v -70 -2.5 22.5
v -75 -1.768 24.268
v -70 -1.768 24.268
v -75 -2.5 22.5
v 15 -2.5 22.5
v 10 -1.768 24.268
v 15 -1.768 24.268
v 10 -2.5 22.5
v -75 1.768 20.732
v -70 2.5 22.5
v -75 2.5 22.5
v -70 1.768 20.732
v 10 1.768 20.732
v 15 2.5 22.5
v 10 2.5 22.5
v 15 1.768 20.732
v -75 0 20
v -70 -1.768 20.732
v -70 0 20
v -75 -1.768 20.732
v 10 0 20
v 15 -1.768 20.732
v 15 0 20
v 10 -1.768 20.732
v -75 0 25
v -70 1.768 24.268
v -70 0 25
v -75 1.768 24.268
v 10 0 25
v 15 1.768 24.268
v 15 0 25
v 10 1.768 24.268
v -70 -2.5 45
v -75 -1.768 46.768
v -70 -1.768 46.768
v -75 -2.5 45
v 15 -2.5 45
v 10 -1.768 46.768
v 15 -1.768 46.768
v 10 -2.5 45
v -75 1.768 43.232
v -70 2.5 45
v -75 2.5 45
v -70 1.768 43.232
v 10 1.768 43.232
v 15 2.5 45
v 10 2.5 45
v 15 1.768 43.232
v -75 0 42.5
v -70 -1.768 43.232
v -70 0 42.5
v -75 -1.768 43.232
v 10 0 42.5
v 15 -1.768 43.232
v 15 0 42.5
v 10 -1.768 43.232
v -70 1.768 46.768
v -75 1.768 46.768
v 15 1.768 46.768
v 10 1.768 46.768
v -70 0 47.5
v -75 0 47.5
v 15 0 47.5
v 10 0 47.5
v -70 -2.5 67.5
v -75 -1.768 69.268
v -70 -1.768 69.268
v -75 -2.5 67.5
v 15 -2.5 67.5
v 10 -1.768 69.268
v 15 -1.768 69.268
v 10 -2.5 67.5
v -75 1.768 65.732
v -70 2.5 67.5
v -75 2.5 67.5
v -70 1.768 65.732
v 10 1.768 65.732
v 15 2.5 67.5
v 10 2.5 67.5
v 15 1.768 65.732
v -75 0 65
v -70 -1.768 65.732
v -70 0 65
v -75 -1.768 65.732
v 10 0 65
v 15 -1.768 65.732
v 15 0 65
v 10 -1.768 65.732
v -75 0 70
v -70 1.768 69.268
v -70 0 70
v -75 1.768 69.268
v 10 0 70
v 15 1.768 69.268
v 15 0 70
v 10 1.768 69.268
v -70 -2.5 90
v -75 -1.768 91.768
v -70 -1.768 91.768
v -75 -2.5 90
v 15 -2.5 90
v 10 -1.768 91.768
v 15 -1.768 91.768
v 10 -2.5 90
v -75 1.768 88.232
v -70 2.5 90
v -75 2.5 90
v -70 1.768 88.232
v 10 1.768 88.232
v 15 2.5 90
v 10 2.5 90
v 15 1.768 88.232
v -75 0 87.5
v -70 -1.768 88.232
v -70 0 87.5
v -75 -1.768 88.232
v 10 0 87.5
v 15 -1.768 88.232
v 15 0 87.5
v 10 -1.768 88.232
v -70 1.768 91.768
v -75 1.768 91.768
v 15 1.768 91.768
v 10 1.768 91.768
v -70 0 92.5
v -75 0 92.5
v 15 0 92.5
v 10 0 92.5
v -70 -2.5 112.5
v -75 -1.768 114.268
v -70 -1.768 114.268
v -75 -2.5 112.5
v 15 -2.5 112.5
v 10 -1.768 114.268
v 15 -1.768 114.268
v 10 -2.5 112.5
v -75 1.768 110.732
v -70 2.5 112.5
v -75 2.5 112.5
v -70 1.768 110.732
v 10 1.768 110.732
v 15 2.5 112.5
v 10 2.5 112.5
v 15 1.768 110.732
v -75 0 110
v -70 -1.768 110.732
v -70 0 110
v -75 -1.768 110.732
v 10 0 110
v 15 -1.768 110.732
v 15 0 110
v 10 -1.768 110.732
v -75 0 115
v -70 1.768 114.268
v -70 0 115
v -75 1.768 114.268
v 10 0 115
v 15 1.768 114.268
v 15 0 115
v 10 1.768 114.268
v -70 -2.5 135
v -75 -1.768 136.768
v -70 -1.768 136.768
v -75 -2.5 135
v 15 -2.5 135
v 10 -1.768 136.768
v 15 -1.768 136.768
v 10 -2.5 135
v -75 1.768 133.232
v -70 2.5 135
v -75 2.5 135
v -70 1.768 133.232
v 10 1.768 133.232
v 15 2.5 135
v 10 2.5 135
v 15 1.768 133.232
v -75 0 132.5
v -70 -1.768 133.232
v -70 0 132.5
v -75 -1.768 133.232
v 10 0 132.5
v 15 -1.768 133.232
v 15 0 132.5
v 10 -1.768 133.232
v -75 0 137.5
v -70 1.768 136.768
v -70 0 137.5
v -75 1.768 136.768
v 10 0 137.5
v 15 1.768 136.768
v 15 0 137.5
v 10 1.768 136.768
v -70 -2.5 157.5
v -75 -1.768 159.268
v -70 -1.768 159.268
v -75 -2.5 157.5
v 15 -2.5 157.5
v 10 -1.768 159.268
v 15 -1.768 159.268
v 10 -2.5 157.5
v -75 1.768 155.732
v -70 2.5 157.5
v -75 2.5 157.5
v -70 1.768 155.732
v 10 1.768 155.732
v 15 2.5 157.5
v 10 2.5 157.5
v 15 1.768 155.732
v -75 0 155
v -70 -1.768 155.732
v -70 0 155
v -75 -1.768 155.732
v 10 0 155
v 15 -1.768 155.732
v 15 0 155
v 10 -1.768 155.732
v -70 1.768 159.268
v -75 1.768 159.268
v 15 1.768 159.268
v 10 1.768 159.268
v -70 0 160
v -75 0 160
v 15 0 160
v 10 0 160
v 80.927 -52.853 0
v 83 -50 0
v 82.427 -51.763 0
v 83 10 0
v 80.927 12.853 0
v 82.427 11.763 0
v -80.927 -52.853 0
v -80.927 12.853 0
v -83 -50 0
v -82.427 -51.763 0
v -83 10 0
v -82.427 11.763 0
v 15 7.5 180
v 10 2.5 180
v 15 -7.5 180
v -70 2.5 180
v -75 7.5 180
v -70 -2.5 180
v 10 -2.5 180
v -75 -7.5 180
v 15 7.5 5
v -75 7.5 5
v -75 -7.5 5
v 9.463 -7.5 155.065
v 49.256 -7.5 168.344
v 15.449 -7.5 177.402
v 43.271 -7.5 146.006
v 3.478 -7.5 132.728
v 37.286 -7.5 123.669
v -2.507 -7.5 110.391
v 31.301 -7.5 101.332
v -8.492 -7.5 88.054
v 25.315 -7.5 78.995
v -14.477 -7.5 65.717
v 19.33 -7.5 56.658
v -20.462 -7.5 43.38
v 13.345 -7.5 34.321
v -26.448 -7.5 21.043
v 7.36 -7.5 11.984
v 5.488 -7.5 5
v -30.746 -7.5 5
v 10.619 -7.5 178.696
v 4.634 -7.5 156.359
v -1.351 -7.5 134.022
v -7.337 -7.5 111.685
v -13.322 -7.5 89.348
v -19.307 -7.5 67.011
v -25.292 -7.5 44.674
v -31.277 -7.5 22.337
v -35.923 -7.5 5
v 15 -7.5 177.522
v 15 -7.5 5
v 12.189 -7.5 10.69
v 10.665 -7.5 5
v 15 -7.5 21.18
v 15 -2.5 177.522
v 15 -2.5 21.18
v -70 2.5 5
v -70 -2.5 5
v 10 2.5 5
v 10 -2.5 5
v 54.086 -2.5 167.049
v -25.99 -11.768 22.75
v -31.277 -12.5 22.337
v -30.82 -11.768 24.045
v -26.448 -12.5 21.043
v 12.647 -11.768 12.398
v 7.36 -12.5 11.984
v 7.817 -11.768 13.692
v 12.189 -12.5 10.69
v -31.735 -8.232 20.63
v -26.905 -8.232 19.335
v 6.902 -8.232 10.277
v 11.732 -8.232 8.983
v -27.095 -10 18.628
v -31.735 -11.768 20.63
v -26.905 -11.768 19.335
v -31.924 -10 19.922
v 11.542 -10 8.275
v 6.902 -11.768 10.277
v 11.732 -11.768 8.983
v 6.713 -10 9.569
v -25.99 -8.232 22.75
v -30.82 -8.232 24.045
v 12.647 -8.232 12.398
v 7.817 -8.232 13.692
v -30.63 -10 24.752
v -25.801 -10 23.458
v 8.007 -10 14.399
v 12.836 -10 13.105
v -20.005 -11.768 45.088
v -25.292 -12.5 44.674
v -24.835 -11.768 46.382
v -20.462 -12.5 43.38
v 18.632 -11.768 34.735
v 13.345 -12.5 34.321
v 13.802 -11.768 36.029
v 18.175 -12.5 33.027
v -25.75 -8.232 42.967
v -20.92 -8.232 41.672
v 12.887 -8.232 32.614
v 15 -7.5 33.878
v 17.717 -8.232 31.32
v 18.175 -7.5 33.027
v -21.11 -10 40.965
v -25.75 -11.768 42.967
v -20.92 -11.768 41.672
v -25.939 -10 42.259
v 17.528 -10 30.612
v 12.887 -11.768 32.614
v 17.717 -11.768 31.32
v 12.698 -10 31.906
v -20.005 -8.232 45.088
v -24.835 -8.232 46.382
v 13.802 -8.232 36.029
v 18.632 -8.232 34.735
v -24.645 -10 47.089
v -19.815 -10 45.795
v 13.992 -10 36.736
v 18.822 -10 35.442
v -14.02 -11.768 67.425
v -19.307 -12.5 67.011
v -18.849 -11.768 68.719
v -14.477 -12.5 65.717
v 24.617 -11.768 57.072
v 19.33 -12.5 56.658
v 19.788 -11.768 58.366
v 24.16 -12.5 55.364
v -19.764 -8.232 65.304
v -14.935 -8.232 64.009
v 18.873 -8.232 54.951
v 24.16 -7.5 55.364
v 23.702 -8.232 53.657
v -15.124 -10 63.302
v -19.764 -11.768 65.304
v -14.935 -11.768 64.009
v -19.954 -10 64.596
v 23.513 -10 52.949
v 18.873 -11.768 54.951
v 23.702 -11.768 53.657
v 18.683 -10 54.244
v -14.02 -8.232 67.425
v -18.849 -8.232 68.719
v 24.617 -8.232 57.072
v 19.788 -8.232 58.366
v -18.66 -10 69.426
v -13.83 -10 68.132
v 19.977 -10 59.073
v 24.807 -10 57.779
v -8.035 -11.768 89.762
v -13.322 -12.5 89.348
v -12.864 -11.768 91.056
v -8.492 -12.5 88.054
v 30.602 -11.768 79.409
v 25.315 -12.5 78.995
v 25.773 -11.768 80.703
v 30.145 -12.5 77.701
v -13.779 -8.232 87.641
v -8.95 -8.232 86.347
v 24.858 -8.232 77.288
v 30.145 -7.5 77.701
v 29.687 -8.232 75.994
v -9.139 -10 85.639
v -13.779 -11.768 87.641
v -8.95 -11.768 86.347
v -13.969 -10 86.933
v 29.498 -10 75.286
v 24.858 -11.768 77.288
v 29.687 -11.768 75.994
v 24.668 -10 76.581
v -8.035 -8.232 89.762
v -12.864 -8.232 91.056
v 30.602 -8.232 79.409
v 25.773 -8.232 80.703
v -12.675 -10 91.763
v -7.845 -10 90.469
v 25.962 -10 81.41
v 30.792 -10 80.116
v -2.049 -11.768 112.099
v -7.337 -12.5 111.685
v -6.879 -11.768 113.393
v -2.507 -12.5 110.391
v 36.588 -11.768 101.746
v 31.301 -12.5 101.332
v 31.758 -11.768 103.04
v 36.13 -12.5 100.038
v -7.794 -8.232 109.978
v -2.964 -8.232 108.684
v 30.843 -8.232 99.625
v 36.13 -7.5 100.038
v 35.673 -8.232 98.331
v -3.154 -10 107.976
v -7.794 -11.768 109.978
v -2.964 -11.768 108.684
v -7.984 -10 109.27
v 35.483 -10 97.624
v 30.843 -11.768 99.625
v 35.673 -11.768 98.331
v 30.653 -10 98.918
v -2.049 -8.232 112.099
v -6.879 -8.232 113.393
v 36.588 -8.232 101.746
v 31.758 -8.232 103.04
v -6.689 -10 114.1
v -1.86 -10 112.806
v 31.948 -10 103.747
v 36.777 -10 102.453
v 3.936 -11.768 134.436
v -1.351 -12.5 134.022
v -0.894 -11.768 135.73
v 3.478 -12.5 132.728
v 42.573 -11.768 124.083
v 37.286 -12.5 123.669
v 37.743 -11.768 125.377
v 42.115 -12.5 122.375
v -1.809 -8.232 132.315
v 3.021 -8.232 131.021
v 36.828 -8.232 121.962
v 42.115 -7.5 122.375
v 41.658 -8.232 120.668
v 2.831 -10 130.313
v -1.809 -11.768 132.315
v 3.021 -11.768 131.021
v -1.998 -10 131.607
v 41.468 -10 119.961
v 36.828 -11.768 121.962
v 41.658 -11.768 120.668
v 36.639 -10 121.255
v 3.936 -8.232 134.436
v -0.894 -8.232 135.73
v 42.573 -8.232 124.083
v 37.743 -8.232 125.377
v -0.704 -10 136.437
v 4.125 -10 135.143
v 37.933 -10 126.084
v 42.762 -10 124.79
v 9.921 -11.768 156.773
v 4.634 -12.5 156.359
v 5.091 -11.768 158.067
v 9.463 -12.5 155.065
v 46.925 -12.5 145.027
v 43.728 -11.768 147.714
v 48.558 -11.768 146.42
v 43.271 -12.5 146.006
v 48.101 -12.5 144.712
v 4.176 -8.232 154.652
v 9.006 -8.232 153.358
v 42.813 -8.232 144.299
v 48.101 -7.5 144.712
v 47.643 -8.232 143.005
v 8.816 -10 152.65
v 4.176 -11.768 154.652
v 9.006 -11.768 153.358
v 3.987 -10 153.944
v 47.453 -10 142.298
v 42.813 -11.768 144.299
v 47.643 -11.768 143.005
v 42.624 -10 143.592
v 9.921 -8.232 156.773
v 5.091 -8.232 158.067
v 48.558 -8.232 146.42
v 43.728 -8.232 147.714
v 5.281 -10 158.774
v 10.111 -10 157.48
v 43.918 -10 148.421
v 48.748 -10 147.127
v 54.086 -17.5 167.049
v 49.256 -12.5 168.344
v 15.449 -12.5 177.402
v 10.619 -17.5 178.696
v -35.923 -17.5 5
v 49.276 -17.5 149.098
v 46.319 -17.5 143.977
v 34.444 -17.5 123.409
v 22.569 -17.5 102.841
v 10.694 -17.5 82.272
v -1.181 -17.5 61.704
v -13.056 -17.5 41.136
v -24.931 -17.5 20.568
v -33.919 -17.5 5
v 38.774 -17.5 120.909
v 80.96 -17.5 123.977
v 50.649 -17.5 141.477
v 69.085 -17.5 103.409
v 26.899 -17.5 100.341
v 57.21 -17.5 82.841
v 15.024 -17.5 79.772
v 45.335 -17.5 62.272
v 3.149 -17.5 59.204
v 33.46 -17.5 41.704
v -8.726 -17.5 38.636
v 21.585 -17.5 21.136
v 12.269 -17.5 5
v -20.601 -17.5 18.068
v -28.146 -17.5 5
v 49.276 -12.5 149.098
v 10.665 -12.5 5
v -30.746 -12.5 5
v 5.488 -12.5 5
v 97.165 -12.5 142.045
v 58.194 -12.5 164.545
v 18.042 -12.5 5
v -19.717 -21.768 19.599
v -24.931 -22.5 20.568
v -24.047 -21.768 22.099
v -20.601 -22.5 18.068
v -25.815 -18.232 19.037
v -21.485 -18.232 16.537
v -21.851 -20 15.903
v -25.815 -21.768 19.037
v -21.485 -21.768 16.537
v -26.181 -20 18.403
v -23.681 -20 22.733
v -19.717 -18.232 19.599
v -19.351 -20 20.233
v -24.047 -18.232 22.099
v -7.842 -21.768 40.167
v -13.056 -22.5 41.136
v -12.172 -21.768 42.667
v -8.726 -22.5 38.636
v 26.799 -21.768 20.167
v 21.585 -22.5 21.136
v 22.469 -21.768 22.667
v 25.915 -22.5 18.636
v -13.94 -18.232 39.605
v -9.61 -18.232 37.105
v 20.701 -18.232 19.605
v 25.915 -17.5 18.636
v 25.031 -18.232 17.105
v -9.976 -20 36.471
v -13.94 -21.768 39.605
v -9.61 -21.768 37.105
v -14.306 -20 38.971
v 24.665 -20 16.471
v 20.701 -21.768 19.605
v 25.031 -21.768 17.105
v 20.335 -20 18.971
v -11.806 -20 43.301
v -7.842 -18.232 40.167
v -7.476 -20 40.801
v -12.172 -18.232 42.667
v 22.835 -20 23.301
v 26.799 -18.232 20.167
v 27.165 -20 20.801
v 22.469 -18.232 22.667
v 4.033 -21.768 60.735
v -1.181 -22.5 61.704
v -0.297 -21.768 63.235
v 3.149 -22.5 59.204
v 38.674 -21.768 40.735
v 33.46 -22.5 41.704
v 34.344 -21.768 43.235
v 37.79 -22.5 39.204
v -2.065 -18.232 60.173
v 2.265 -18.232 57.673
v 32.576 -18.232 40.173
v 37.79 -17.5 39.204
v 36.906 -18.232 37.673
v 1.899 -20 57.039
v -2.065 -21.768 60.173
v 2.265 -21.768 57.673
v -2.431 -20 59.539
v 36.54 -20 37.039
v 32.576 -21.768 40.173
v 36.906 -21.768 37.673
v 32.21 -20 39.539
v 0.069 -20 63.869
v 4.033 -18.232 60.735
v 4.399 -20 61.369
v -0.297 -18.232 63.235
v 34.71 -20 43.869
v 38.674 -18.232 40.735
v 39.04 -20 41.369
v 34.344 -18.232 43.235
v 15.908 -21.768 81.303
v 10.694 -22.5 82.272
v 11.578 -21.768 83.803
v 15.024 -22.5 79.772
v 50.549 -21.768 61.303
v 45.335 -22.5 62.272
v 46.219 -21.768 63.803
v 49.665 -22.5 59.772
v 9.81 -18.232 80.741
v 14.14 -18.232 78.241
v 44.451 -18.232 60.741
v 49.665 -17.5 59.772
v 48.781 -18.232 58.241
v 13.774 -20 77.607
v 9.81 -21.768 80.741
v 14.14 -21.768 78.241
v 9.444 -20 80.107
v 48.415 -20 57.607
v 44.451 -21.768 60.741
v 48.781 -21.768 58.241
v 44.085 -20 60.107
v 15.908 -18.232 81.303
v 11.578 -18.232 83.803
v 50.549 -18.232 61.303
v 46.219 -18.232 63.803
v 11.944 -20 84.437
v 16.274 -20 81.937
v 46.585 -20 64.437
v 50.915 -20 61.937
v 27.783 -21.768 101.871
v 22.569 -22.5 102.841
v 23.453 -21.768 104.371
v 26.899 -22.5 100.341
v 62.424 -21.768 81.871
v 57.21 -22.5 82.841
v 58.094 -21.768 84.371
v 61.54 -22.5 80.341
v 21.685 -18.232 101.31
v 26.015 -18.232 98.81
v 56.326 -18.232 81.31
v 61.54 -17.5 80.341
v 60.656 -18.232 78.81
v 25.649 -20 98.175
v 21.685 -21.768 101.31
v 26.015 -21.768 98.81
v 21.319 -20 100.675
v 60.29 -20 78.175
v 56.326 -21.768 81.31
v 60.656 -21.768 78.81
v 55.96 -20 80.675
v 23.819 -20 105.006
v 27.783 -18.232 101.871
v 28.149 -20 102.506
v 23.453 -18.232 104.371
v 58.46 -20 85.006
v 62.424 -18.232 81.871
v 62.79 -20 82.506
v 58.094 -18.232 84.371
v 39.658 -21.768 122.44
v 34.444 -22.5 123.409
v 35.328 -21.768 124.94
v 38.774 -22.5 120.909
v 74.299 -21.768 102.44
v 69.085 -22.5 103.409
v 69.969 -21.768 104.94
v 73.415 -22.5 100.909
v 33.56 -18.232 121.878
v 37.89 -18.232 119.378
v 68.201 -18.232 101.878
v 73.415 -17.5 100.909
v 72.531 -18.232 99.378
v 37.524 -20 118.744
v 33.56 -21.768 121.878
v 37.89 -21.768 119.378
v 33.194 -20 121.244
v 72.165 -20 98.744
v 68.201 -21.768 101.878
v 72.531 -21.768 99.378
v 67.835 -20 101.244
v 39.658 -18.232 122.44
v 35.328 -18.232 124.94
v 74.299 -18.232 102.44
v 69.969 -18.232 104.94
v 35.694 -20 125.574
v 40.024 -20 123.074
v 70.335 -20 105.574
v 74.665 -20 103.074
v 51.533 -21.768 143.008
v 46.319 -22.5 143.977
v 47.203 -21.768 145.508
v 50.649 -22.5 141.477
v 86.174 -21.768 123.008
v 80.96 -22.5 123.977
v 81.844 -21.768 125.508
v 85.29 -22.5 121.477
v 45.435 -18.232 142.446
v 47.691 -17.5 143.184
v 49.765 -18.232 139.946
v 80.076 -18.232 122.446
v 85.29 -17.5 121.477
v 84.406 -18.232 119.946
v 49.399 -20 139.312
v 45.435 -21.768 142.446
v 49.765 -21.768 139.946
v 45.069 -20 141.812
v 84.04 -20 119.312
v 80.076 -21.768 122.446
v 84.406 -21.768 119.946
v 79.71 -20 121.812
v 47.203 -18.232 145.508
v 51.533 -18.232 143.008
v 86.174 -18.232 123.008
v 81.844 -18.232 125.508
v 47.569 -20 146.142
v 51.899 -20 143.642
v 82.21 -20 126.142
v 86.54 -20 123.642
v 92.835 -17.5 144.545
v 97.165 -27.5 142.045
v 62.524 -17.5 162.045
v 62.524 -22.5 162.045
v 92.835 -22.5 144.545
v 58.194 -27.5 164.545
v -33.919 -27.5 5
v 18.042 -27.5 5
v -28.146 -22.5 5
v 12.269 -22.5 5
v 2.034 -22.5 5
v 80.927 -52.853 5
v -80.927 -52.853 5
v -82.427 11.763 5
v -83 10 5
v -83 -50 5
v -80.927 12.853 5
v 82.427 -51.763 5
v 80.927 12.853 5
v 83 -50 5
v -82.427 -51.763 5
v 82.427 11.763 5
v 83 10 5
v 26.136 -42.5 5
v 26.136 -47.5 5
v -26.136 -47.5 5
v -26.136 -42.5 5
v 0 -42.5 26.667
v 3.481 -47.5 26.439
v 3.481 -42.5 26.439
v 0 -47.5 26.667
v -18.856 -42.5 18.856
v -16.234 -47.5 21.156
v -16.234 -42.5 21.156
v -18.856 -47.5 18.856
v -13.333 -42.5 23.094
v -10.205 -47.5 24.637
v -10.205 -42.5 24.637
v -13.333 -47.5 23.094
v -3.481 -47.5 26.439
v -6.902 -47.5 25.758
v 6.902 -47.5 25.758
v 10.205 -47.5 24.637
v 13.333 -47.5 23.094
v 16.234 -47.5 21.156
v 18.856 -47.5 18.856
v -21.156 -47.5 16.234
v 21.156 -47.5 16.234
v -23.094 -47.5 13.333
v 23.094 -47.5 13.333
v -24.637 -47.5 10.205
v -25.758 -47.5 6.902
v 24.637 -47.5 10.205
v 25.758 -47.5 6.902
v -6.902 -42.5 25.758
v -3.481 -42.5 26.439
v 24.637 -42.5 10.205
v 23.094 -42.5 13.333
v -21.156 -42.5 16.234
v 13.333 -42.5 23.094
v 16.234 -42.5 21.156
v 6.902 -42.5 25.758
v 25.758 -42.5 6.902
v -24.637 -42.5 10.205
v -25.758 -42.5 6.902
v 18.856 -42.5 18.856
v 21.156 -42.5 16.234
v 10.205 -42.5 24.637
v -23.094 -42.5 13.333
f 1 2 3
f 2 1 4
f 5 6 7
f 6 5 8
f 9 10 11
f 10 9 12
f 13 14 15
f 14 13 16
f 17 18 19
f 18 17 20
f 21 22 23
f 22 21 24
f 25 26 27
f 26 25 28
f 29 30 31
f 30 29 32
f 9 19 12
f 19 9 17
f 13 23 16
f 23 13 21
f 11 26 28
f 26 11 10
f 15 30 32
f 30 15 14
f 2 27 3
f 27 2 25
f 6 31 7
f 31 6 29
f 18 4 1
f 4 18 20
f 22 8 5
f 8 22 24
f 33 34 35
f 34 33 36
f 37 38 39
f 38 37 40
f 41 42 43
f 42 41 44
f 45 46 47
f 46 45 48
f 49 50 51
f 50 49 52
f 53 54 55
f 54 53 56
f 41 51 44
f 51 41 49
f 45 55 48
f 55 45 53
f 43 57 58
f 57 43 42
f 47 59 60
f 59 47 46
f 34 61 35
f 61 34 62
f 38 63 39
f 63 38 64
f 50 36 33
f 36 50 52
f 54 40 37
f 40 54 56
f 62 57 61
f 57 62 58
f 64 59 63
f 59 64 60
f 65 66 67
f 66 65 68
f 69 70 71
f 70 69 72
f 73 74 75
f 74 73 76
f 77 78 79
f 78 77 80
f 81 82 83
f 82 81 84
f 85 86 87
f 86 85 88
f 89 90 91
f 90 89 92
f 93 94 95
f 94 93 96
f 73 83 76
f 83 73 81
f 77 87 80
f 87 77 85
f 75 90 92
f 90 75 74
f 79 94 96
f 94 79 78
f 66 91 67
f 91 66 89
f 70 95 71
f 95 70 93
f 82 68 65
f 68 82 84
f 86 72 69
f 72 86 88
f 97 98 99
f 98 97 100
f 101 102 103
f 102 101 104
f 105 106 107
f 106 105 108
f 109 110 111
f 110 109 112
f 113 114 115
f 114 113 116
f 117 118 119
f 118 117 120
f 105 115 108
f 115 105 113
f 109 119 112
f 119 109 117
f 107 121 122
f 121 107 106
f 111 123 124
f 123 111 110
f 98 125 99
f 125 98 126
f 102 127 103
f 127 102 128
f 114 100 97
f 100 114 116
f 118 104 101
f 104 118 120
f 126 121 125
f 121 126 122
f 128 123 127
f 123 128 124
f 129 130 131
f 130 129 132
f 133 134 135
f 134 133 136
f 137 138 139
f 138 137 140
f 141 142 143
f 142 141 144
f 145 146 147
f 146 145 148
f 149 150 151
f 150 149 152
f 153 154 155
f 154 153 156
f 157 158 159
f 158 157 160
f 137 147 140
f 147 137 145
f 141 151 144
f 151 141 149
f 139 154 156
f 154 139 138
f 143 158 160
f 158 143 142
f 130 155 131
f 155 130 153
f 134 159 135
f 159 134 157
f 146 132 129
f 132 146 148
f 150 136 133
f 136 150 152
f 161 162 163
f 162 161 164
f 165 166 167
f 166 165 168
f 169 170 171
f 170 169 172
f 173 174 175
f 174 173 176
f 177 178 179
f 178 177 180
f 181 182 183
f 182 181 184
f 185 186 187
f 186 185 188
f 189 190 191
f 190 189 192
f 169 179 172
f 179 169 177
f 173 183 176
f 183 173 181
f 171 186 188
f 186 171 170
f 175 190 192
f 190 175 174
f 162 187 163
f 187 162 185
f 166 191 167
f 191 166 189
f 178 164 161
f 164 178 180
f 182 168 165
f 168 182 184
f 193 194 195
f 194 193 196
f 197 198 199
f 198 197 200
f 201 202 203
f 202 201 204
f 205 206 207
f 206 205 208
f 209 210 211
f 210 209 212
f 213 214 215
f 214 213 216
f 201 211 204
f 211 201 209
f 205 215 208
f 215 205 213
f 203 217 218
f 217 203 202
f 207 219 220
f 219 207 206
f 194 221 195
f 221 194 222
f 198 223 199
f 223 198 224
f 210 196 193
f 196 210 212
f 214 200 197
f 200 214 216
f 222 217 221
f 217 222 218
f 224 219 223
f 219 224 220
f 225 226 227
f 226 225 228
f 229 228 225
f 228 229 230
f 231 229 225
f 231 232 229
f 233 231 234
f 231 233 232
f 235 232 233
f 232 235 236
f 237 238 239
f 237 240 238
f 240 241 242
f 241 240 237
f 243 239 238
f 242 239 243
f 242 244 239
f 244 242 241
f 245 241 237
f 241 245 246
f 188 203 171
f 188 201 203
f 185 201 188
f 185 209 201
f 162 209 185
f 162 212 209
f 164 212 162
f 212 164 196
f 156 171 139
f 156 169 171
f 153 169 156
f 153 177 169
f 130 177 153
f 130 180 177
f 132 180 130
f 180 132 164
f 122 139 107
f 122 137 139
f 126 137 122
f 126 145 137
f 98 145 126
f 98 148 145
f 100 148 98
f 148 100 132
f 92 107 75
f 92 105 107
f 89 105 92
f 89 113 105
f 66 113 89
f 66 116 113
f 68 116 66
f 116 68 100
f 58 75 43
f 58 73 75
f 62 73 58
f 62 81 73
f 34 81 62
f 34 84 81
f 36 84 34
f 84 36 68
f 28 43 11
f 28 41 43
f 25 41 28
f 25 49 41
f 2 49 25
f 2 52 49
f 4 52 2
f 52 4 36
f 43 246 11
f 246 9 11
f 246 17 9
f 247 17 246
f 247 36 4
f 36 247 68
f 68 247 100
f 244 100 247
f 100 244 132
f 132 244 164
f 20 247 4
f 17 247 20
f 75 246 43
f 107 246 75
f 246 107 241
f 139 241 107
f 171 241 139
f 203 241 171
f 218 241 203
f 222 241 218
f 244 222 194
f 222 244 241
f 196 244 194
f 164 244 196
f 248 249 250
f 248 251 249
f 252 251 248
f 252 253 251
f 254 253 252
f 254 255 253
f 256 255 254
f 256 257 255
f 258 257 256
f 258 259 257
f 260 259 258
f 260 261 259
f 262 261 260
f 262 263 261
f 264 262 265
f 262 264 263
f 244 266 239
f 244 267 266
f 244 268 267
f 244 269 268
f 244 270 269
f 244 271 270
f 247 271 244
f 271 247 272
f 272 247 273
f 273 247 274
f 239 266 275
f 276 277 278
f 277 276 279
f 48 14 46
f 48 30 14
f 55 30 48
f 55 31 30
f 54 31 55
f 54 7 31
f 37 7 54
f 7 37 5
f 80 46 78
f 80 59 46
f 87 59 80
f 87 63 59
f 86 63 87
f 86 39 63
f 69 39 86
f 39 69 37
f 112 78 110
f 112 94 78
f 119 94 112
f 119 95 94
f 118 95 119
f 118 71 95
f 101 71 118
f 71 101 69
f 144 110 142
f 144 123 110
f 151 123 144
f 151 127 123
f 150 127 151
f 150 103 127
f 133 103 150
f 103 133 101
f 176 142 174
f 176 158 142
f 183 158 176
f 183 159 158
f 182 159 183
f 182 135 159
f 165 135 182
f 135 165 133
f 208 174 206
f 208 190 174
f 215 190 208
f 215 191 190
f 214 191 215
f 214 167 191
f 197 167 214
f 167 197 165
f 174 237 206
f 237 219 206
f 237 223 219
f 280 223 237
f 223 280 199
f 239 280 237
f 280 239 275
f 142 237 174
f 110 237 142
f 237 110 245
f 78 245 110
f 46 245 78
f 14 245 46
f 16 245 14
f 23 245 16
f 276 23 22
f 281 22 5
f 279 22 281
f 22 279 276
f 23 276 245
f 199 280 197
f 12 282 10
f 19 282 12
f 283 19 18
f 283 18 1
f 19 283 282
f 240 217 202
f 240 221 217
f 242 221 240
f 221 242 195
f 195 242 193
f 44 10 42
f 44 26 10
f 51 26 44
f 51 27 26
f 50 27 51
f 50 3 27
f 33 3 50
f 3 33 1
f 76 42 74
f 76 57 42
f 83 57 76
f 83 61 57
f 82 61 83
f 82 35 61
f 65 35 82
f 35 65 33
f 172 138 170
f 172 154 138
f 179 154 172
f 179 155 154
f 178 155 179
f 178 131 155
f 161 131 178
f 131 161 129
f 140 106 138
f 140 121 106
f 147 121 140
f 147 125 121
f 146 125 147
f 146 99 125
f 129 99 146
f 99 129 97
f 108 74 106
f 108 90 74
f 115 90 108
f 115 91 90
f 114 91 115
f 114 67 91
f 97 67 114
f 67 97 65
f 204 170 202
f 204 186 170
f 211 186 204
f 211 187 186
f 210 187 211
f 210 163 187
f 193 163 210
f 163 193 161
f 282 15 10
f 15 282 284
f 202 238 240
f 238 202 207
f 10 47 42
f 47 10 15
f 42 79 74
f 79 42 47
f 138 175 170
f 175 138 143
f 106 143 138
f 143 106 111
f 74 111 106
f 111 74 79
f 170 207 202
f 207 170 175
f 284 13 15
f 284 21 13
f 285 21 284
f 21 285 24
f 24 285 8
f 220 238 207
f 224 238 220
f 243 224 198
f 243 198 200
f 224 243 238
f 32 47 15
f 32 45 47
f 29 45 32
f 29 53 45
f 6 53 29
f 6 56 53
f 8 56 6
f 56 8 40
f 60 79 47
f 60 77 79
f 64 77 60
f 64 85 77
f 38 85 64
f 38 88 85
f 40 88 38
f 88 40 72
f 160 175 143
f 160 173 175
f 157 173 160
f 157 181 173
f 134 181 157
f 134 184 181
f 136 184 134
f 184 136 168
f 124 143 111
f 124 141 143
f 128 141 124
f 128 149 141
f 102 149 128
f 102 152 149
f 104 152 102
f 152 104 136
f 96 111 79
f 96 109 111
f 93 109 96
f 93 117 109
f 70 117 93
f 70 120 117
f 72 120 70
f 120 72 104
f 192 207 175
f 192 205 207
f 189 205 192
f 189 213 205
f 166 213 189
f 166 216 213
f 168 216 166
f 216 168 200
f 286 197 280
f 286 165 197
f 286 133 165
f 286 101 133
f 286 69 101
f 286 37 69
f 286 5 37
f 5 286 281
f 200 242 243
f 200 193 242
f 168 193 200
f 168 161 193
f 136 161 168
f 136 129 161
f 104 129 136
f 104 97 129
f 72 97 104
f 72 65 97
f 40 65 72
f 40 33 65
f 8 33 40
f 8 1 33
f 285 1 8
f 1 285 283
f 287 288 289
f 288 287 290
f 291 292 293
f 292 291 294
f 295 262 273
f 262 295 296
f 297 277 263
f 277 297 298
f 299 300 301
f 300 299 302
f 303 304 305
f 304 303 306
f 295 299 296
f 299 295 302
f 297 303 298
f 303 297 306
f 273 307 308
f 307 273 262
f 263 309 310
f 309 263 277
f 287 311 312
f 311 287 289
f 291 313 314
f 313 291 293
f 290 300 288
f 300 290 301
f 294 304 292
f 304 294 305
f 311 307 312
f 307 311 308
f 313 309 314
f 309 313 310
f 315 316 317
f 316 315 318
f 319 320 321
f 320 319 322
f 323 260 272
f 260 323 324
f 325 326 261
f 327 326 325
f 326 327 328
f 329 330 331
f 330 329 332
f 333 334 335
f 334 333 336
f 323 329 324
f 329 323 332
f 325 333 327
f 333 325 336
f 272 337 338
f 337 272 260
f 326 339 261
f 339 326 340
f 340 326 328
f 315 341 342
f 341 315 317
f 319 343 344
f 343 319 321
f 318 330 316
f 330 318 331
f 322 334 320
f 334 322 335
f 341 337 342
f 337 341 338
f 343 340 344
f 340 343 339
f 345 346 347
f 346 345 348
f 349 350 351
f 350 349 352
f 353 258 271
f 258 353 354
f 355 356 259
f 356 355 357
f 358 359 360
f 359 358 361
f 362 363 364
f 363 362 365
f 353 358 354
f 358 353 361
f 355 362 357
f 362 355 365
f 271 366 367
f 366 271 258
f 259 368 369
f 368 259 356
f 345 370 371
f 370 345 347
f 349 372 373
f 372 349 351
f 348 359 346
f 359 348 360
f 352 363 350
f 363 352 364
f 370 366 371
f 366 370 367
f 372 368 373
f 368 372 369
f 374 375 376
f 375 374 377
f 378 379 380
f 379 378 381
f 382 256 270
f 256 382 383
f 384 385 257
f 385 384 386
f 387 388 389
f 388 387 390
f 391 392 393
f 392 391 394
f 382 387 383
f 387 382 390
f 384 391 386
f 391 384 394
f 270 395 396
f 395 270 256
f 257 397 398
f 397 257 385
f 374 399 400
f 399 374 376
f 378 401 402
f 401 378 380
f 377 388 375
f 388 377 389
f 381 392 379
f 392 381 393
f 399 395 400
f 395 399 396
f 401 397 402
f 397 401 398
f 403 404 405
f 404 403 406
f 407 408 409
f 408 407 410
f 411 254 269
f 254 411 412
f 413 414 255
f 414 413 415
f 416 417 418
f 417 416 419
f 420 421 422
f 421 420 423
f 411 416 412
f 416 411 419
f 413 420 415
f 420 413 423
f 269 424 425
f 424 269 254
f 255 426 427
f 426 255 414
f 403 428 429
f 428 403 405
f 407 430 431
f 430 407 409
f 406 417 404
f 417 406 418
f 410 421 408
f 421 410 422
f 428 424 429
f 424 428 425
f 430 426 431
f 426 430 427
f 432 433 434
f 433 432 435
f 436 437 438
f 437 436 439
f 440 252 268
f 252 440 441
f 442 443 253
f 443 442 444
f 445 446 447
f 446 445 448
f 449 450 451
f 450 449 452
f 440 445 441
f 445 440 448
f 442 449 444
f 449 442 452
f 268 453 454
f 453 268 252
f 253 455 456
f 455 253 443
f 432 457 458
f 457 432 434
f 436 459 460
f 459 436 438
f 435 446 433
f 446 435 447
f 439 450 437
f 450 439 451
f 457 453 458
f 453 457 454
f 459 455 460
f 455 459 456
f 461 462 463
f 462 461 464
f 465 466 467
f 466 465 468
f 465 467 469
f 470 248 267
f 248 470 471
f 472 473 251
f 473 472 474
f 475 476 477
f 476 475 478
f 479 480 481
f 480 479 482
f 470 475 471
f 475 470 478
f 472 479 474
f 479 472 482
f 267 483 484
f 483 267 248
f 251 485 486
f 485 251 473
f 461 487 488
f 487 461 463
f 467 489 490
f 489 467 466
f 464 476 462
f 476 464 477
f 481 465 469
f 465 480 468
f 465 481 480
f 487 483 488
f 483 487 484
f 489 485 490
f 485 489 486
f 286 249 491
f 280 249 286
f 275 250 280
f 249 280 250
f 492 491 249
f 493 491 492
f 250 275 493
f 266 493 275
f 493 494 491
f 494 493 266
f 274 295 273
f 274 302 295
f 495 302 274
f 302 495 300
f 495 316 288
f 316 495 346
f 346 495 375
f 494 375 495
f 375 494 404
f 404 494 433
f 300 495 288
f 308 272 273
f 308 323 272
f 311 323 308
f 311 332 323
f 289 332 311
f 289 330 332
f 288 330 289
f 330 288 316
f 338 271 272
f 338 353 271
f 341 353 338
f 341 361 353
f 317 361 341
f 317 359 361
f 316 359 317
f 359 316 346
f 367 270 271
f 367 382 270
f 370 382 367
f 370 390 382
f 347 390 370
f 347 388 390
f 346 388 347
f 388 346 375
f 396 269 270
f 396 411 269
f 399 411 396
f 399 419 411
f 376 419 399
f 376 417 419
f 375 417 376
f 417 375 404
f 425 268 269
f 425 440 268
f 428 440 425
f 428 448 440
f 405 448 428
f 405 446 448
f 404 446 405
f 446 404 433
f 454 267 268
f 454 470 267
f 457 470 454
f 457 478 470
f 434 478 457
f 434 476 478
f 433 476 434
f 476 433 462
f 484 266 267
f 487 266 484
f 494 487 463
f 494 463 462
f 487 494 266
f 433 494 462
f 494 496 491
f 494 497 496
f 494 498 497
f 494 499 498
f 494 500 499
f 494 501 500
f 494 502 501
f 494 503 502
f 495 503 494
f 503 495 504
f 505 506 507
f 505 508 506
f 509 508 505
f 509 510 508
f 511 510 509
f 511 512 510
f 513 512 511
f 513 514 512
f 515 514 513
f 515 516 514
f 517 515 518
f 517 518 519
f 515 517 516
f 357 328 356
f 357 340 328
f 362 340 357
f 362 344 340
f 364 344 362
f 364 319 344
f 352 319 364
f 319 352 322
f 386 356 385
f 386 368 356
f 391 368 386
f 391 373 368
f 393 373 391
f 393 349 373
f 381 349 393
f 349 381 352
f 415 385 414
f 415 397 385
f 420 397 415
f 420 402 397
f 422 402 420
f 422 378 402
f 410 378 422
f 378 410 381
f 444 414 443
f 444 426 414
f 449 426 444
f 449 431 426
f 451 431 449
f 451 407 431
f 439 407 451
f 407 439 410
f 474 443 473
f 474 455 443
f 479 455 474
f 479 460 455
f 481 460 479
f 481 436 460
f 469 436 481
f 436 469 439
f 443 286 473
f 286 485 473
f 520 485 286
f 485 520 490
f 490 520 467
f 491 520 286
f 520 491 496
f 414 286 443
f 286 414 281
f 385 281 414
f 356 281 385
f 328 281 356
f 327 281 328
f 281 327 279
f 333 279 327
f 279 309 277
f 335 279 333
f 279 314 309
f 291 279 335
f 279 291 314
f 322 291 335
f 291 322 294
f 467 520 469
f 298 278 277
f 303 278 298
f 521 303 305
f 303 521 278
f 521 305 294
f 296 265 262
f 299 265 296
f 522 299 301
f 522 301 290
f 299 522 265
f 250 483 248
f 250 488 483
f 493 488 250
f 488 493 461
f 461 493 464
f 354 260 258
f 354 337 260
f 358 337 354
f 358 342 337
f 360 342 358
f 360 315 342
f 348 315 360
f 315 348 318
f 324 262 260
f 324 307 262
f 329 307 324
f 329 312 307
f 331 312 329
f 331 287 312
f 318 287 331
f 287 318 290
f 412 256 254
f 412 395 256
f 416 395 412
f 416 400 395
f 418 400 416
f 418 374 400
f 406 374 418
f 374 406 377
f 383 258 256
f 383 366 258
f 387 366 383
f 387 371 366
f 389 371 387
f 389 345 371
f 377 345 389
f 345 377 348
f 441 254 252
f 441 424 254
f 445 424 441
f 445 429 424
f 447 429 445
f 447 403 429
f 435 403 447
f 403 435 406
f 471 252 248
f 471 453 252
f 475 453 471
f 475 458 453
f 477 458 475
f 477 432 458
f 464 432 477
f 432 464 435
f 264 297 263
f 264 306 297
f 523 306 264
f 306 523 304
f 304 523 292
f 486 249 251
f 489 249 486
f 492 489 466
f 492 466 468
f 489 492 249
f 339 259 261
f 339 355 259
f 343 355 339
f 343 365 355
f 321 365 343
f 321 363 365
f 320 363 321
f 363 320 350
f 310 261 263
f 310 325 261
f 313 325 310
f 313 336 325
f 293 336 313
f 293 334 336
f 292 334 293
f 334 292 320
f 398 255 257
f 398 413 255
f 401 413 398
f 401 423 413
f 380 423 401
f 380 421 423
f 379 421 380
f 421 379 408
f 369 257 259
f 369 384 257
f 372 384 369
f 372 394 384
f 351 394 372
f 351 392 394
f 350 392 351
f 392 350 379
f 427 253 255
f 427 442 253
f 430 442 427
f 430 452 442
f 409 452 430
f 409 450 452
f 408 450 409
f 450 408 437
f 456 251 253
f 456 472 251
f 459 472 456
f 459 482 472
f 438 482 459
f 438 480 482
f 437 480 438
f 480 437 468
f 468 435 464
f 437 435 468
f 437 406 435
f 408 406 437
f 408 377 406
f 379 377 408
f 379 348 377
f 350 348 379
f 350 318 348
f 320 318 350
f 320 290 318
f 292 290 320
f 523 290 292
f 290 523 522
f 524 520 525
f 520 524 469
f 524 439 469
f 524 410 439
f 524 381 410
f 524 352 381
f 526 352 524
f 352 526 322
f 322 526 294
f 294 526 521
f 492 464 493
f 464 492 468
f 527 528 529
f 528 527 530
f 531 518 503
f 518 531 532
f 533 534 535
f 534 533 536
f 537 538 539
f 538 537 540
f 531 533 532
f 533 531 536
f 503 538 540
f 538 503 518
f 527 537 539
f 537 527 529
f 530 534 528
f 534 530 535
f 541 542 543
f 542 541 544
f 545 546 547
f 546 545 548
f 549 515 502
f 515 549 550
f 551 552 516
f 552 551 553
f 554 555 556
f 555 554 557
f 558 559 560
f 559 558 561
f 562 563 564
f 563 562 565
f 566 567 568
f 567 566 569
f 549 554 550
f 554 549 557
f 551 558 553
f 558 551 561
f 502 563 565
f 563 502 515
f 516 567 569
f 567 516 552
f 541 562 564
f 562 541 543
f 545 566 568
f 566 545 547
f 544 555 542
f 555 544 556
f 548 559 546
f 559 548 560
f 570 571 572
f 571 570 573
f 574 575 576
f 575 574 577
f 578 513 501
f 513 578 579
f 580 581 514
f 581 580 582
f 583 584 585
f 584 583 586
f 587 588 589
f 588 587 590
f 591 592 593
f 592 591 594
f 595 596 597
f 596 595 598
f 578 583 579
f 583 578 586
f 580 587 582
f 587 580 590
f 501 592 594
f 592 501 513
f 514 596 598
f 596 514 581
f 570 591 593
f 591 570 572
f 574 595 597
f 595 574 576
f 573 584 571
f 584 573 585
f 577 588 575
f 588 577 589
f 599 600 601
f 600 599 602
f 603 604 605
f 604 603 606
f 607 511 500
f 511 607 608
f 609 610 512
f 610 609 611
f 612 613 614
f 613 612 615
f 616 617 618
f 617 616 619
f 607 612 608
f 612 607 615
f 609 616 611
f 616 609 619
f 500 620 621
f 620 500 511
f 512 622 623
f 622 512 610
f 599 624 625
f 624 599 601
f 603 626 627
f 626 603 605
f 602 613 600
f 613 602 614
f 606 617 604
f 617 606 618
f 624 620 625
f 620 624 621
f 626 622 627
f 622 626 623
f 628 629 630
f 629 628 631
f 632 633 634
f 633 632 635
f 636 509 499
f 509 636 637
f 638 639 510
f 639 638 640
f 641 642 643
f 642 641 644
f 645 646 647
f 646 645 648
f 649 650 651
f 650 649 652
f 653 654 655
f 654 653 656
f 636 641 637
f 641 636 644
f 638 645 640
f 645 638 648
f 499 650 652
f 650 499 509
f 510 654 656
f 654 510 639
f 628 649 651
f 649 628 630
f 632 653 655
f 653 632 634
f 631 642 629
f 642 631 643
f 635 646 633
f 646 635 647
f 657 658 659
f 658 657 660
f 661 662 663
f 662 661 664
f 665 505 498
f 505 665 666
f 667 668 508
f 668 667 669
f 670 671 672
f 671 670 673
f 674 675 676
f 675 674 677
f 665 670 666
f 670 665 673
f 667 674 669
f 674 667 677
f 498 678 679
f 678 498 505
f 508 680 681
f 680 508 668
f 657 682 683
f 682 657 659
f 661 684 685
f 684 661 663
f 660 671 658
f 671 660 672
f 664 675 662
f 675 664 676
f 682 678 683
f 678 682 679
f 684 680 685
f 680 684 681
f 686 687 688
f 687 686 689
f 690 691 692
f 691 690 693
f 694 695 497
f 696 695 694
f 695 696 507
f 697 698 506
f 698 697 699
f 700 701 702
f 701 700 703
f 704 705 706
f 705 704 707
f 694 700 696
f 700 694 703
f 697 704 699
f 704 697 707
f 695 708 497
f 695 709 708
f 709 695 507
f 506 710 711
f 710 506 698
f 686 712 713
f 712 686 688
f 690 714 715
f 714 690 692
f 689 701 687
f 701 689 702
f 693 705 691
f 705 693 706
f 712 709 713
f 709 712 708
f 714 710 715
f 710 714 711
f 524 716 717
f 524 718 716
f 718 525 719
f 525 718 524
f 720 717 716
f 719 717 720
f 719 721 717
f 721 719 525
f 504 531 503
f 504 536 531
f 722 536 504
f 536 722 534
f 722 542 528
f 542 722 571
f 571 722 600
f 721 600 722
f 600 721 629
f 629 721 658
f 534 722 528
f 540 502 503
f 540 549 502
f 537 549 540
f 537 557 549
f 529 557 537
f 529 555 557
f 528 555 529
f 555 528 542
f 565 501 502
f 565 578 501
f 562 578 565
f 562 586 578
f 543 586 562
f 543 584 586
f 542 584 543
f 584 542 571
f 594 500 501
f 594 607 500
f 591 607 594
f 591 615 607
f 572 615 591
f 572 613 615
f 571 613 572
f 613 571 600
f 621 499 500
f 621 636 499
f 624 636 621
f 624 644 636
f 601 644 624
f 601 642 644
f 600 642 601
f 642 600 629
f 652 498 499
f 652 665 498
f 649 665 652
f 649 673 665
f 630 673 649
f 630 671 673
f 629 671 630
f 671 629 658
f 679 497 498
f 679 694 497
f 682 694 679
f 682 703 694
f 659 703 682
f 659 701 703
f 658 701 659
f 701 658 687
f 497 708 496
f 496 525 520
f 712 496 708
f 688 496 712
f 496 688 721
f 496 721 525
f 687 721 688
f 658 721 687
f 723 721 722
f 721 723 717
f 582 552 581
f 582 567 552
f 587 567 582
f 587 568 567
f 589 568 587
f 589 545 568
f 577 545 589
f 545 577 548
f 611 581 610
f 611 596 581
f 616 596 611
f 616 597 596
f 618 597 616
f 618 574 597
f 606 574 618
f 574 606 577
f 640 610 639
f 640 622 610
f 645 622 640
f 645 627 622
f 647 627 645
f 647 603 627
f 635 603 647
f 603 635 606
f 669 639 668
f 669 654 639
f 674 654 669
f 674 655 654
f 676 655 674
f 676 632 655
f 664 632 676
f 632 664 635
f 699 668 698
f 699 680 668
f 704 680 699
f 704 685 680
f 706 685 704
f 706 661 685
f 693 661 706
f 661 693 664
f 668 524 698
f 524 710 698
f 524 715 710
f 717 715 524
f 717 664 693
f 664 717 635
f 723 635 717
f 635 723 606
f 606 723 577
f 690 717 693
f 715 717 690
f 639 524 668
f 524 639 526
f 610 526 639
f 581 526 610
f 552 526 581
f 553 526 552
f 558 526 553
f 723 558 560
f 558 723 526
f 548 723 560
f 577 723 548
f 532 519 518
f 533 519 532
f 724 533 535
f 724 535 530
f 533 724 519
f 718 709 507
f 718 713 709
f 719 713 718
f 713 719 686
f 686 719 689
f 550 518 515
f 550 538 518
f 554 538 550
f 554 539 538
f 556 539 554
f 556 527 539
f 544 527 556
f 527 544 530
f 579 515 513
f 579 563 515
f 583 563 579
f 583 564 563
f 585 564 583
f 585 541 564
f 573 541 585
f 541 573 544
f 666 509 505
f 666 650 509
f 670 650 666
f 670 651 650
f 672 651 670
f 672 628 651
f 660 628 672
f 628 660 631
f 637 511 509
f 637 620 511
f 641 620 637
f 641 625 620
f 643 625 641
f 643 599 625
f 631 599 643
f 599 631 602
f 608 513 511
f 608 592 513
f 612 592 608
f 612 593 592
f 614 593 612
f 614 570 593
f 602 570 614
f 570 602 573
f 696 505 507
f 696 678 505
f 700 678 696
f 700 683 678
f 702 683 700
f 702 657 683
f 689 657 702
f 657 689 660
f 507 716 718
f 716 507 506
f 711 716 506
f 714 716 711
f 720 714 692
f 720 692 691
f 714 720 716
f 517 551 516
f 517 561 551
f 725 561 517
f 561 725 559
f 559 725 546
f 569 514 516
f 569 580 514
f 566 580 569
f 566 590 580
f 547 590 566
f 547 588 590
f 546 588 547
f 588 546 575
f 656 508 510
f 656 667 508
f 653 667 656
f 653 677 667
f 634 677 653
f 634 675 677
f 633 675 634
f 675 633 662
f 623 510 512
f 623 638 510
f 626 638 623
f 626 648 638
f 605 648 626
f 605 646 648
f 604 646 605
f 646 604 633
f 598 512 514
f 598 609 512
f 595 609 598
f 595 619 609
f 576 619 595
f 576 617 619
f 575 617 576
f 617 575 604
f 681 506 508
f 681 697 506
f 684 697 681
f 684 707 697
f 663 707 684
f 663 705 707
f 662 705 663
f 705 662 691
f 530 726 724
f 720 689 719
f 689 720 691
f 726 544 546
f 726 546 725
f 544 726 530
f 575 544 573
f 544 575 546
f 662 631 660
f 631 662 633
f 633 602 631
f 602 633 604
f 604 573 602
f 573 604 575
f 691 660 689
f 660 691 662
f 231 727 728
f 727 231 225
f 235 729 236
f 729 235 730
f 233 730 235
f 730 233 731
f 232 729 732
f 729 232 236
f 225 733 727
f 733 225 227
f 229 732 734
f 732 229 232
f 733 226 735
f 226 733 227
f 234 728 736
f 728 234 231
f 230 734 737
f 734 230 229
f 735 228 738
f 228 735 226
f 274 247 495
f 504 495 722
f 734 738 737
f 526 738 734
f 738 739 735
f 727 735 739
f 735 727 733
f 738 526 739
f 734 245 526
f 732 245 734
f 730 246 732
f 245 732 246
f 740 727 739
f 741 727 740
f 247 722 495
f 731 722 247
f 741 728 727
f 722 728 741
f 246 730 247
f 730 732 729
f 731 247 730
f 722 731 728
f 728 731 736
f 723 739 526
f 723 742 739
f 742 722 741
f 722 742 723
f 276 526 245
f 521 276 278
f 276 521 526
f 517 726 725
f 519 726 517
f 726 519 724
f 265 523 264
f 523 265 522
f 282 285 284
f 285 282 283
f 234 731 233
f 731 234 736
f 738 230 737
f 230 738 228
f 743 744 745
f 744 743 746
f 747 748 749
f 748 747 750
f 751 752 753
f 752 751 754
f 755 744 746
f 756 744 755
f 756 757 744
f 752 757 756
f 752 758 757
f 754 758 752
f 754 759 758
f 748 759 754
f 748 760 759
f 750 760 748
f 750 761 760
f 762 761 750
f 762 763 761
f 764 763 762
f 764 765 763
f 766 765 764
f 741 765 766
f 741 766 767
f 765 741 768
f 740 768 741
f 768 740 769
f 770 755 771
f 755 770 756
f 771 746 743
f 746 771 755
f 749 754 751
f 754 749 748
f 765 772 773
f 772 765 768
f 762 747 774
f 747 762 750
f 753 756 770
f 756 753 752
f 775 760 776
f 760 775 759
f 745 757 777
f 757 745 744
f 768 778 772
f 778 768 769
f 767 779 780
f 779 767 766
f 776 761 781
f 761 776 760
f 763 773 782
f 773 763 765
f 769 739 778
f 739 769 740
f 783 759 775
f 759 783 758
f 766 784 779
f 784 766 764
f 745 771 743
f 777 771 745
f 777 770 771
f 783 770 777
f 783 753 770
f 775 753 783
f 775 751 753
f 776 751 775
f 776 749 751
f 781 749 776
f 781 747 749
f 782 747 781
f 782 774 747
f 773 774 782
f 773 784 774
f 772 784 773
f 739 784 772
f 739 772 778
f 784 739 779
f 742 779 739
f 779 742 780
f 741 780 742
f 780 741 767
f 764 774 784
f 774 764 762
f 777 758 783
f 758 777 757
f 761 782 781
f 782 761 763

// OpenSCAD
cutting_board_thicnkess = 15;

bottom_length = 160;
bottom_height = 5;

edge_width = 5;
slot_width = 5;

knife_1_length = 180;
knife_1_width = 80;

knife_2_length = 185;
knife_2_width = 35;

knife_3_length = 190;
knife_3_width = 35;

module cutting_board_knife_rack(knifes, bottom_length, bottom_height, edge_width, slot_width, offset_angle = 15) {

    offset_y = slot_width + edge_width;
    len_of_knifes = len(knifes);

    bottom_width = offset_y * len_of_knifes + cutting_board_thicnkess + edge_width * 2 + slot_width;

    for(i = [0:len_of_knifes - 1]) {

        a = offset_angle * i;
        offset_z = (knifes[i][1] + 2 * edge_width) * sin(a);
        w = (knifes[i][1] + 2 * edge_width) / cos(a) * 2;

        translate([0, -offset_y * i, 0]) difference() {
            // a knife holder
            translate([-w / 6 , 0, -0.5 * offset_z]) rotate([0, a, 0]) difference() {
                linear_extrude(knifes[i][0]) difference() {
                    square([
                        knifes[i][1] + 2 * edge_width, 
                        slot_width + 2 * edge_width
                    ], center = true);
                        
                    square([knifes[i][1], slot_width], center = true);
                }
                
                // vents
                for(j = [0:7]) {
                    translate([0, 0, knifes[i][0] / 8 * j]) 
                        rotate([0, 90, 0]) 
                            linear_extrude(knifes[i][0], center = true) 
                                circle(slot_width / 2);
                }
            }
            
            // cut off the bottom of the holder
            translate([0, 0, -offset_z]) 
                linear_extrude(offset_z) 
                   square([w, slot_width + 2 * edge_width], center = true);
        }

    }

    // rack bottom
    translate([0, -bottom_width / 2 + edge_width + slot_width, 0]) 
        linear_extrude(bottom_height) minkowski() {
        
        square([bottom_length, bottom_width], center = true);
        circle(bottom_width / 20);
    }

    // cutting board holder
    translate([0, -offset_y * len_of_knifes - cutting_board_thicnkess, 0]) 
        rotate([-90, 0, 0]) linear_extrude(edge_width, center = true) difference() {
        
        circle(bottom_length / 6, $fn = 48);
        
        translate([-bottom_length / 4, 0, 0]) 
            square([bottom_length / 2, bottom_length / 2]);
    }

}

cutting_board_knife_rack(
    [
        [knife_1_length, knife_1_width], 
        [knife_2_length, knife_2_width], 
        [knife_3_length, knife_3_width]
    ], 
    bottom_length, 
    bottom_height, 
    edge_width, 
    slot_width,
    15 // offset_angle
);
